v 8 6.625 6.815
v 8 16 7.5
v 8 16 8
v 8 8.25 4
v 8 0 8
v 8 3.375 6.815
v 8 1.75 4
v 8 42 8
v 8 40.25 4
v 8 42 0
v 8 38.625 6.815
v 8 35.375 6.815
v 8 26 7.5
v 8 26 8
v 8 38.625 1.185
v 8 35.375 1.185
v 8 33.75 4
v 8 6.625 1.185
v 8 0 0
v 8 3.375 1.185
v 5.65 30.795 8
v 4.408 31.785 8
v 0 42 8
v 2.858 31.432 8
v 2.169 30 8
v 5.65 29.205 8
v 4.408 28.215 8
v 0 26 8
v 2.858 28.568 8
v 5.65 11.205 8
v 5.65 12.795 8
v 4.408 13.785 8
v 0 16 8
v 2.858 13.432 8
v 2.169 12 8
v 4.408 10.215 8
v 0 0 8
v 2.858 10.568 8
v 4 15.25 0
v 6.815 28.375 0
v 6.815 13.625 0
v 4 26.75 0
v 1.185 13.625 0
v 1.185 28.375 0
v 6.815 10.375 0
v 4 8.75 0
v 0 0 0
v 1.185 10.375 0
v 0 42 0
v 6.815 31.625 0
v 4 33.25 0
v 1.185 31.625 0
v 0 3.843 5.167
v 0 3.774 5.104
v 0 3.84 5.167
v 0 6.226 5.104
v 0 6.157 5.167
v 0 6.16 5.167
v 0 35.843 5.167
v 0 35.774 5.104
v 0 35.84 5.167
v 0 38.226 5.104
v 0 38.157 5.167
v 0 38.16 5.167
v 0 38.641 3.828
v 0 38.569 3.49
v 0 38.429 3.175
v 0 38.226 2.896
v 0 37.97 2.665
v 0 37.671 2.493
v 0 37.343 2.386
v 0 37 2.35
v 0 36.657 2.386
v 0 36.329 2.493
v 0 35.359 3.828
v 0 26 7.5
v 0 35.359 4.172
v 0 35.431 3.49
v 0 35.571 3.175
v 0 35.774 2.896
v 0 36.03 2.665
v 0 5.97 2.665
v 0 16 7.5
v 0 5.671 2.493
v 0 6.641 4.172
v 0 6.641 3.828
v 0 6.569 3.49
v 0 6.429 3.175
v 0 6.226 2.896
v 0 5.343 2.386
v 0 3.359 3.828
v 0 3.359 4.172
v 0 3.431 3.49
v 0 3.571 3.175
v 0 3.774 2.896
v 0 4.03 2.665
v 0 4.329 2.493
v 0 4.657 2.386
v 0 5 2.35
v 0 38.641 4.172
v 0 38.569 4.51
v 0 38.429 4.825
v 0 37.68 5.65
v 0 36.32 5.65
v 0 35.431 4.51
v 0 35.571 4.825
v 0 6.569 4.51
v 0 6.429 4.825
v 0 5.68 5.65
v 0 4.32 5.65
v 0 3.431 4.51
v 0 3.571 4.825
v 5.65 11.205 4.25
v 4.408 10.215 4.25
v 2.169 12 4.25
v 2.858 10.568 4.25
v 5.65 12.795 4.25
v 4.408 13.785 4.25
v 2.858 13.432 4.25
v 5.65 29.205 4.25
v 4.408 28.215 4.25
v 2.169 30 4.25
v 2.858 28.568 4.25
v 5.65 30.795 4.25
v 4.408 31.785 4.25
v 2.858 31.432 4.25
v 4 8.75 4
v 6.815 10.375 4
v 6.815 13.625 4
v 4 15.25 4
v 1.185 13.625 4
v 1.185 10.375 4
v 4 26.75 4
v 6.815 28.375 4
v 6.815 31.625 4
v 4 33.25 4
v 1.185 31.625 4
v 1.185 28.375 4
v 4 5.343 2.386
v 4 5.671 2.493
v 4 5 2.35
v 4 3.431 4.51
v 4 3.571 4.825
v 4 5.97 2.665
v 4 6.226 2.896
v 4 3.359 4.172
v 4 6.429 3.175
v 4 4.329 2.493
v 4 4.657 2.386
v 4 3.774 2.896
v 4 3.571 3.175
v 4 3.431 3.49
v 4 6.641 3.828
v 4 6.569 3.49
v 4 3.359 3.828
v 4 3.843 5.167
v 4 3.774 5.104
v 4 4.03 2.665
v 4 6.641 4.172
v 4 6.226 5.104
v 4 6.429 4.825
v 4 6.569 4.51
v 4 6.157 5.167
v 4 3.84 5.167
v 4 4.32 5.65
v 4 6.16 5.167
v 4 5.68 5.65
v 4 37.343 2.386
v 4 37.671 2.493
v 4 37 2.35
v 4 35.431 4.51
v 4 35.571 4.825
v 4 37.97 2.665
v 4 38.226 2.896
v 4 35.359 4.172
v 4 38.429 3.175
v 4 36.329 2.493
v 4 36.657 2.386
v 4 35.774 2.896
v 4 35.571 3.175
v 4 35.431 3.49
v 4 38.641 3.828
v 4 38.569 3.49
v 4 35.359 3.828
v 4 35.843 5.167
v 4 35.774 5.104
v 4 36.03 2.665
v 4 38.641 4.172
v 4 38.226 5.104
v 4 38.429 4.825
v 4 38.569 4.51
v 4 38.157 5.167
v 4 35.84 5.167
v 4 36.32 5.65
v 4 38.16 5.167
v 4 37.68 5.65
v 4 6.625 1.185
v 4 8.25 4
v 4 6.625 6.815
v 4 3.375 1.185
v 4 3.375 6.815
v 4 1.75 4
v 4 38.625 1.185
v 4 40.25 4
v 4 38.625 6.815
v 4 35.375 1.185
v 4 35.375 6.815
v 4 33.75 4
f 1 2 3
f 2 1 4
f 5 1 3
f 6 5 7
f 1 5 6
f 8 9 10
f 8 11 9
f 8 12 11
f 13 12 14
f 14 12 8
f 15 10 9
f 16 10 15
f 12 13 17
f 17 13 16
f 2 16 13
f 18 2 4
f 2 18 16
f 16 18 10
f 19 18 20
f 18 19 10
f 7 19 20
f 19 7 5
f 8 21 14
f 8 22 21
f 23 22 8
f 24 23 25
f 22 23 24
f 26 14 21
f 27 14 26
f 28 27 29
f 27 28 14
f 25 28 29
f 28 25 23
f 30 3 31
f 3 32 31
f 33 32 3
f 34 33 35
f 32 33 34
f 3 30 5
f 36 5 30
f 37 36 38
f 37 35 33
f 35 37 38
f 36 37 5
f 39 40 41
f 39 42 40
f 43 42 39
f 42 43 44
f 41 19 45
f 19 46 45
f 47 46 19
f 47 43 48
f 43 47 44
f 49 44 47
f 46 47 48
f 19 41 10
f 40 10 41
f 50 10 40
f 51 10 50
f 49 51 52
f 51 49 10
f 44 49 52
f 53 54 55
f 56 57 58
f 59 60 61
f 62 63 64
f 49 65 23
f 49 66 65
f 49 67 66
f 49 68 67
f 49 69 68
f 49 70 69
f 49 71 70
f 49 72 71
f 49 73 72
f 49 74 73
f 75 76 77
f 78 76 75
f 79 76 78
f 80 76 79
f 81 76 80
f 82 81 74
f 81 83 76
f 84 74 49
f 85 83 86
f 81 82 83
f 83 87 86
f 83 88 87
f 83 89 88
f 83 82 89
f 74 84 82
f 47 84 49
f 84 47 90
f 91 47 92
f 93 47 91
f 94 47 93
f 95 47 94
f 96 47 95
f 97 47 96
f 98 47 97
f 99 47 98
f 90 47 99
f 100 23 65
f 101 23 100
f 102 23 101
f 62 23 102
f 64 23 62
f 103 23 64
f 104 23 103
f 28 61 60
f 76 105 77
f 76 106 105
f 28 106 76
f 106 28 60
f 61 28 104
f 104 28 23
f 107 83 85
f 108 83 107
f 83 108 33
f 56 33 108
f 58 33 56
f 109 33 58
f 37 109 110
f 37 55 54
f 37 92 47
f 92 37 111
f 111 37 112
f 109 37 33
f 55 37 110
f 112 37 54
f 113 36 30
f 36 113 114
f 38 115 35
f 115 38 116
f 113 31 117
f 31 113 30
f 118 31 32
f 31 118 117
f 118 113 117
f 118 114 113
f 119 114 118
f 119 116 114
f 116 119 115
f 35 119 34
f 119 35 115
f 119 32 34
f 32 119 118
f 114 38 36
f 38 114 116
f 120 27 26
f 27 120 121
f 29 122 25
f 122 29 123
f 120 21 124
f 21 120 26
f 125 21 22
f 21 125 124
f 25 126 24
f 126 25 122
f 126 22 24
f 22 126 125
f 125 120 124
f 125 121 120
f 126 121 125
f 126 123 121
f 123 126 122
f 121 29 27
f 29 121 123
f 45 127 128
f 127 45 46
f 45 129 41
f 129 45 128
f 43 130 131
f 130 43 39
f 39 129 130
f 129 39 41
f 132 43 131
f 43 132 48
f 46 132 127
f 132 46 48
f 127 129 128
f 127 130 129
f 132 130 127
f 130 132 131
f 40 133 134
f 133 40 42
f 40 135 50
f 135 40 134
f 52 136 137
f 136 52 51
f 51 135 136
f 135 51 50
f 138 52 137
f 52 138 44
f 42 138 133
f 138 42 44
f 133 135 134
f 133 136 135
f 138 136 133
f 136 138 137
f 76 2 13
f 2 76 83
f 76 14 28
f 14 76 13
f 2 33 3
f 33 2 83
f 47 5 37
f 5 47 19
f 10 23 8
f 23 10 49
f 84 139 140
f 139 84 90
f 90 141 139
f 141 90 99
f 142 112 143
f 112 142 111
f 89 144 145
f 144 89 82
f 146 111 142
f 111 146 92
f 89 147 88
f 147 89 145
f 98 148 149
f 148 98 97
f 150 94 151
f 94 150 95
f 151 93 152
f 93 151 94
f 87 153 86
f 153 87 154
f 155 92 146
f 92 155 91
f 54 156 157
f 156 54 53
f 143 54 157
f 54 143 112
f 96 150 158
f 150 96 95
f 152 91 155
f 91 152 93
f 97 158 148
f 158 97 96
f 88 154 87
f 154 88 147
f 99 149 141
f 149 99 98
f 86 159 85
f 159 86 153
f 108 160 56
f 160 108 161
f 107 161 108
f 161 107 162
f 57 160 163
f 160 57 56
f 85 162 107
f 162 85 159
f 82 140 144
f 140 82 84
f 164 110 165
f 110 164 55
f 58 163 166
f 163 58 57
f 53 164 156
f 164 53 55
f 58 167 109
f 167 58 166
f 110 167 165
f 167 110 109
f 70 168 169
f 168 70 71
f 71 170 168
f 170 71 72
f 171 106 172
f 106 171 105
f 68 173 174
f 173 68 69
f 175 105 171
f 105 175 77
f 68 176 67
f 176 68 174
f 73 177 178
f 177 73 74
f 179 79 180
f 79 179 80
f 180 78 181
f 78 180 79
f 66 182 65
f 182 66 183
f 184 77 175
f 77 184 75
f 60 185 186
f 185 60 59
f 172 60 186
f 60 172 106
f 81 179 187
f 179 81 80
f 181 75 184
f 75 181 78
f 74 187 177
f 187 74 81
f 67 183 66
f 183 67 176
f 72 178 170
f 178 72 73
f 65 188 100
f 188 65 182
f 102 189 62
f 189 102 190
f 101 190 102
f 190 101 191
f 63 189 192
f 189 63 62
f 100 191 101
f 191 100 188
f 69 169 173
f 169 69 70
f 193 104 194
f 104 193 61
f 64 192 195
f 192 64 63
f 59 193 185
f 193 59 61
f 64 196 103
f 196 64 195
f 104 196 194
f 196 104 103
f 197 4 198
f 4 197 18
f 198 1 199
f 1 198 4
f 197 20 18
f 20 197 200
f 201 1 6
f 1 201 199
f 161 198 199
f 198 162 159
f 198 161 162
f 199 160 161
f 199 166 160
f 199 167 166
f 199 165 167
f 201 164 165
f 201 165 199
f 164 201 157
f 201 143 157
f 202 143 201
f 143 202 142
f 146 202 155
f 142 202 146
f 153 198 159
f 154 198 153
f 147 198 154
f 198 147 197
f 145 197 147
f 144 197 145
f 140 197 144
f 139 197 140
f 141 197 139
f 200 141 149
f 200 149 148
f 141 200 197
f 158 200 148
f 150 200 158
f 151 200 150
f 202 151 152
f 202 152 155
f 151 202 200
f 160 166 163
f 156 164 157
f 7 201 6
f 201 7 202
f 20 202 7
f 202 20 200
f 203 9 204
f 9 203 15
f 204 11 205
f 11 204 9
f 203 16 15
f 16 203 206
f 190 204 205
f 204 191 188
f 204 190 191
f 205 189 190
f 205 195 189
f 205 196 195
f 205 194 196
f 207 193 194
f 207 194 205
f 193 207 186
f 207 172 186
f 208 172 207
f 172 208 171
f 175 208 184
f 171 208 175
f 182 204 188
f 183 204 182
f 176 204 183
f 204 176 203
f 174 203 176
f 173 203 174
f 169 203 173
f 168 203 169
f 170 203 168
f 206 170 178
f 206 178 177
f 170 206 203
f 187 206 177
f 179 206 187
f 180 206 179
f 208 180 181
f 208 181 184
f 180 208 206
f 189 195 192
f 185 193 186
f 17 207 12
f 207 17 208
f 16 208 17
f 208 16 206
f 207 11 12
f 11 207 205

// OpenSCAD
// file: truncated_teardrop.scad
include <MCAD/teardrop.scad>;

module truncated_teardrop(radius, length) {
	translate([length/2, 0, 0])
	intersection() {
		teardrop(radius, length, angle=90);

		translate([-length/2, -radius, -radius])
			cube([length, 2*radius, 2*radius]);
	}
}
// main file
include <MCAD/polyholes.scad>;
include <MCAD/units.scad>;

include <truncated_teardrop.scad>;


/*
 * A general-purpose mount for the PD Buddy Sink
 */
module sink_mount(layer_thickness=0.25*mm, height=8*mm, nut_depth=4*mm,
		cutout=0.5*mm, bolt_tolerance=0.3*mm, nut_tolerance=0.05*mm) {
	/* Width of the PD Buddy Sink */
	sink_width = 26*mm;

	difference() {
		/* Body of the mount */
		cube([8*mm, sink_width, height]);

		/* Bolt hole bottom height.  Leave one layer_thickness as a bridge. */
		bhbot = nut_depth + layer_thickness;
		/* Bolt holes */
		translate([4*mm, 4*mm, bhbot])
			polyhole(d=3*mm + bolt_tolerance, h=height - bhbot + epsilon);
		translate([4*mm, sink_width-4*mm, bhbot])
			polyhole(d=3*mm + bolt_tolerance, h=height - bhbot + epsilon);

		/* Nut holes */
		translate([4*mm, 4*mm, -epsilon])
			rotate([0, 0, 30])
			cylinder(r=6.4*mm / 2 + nut_tolerance, h=nut_depth + epsilon, $fn=6);
		translate([4*mm, sink_width - 4*mm, -epsilon])
			rotate([0, 0, 30])
			cylinder(r=6.4*mm / 2 + nut_tolerance, h=nut_depth + epsilon, $fn=6);

		/* Small cutout to clear any solder bulges under the USB connector */
		translate([-epsilon, 8*mm, height - cutout])
			cube([8*mm + 2*epsilon, sink_width - 2*8*mm, cutout + epsilon]);
	}
}

/*
 * A bracket for mounting the PD Buddy Sink on a panel
 */
module sink_bracket(layer_thickness=0.25*mm, height=8*mm, nut_depth=4*mm,
		cutout=0.5*mm, bolt_tolerance=0.3*mm, nut_tolerance=0.05*mm) {
	sink_width = 26*mm;
	halfend_width = 8*mm;
	bracket_width = sink_width + 2*halfend_width;

	mount_distance = 5*mm;

	difference() {
		union() {
			cube([8*mm, halfend_width, height]);

			translate([0, halfend_width, 0])
				sink_mount(layer_thickness=layer_thickness, height=height,
						nut_depth=nut_depth, cutout=cutout,
						bolt_tolerance=bolt_tolerance,
						nut_tolerance=nut_tolerance);

			translate([0, halfend_width + sink_width, 0])
				cube([8*mm, halfend_width, height]);
		}

		/* Bolt holes */
		translate([-epsilon, mount_distance, height/2])
			truncated_teardrop(radius=(3*mm + bolt_tolerance)/2,
					length=8*mm + 2*epsilon);
		translate([-epsilon, bracket_width - mount_distance, height/2])
			truncated_teardrop(radius=(3*mm + bolt_tolerance)/2,
					length=8*mm + 2*epsilon);

		/* Nut holes */
		translate([4*mm, mount_distance, height/2])
			rotate([0, 90, 0])
			rotate([0, 0, 30])
			cylinder(r=6.4*mm / 2 + nut_tolerance, h=nut_depth + epsilon, $fn=6);
		translate([4*mm, bracket_width - mount_distance, height/2])
			rotate([0, 90, 0])
			rotate([0, 0, 30])
			cylinder(r=6.4*mm / 2 + nut_tolerance, h=nut_depth + epsilon, $fn=6);
	}
}


sink_bracket(layer_thickness=0.25);
